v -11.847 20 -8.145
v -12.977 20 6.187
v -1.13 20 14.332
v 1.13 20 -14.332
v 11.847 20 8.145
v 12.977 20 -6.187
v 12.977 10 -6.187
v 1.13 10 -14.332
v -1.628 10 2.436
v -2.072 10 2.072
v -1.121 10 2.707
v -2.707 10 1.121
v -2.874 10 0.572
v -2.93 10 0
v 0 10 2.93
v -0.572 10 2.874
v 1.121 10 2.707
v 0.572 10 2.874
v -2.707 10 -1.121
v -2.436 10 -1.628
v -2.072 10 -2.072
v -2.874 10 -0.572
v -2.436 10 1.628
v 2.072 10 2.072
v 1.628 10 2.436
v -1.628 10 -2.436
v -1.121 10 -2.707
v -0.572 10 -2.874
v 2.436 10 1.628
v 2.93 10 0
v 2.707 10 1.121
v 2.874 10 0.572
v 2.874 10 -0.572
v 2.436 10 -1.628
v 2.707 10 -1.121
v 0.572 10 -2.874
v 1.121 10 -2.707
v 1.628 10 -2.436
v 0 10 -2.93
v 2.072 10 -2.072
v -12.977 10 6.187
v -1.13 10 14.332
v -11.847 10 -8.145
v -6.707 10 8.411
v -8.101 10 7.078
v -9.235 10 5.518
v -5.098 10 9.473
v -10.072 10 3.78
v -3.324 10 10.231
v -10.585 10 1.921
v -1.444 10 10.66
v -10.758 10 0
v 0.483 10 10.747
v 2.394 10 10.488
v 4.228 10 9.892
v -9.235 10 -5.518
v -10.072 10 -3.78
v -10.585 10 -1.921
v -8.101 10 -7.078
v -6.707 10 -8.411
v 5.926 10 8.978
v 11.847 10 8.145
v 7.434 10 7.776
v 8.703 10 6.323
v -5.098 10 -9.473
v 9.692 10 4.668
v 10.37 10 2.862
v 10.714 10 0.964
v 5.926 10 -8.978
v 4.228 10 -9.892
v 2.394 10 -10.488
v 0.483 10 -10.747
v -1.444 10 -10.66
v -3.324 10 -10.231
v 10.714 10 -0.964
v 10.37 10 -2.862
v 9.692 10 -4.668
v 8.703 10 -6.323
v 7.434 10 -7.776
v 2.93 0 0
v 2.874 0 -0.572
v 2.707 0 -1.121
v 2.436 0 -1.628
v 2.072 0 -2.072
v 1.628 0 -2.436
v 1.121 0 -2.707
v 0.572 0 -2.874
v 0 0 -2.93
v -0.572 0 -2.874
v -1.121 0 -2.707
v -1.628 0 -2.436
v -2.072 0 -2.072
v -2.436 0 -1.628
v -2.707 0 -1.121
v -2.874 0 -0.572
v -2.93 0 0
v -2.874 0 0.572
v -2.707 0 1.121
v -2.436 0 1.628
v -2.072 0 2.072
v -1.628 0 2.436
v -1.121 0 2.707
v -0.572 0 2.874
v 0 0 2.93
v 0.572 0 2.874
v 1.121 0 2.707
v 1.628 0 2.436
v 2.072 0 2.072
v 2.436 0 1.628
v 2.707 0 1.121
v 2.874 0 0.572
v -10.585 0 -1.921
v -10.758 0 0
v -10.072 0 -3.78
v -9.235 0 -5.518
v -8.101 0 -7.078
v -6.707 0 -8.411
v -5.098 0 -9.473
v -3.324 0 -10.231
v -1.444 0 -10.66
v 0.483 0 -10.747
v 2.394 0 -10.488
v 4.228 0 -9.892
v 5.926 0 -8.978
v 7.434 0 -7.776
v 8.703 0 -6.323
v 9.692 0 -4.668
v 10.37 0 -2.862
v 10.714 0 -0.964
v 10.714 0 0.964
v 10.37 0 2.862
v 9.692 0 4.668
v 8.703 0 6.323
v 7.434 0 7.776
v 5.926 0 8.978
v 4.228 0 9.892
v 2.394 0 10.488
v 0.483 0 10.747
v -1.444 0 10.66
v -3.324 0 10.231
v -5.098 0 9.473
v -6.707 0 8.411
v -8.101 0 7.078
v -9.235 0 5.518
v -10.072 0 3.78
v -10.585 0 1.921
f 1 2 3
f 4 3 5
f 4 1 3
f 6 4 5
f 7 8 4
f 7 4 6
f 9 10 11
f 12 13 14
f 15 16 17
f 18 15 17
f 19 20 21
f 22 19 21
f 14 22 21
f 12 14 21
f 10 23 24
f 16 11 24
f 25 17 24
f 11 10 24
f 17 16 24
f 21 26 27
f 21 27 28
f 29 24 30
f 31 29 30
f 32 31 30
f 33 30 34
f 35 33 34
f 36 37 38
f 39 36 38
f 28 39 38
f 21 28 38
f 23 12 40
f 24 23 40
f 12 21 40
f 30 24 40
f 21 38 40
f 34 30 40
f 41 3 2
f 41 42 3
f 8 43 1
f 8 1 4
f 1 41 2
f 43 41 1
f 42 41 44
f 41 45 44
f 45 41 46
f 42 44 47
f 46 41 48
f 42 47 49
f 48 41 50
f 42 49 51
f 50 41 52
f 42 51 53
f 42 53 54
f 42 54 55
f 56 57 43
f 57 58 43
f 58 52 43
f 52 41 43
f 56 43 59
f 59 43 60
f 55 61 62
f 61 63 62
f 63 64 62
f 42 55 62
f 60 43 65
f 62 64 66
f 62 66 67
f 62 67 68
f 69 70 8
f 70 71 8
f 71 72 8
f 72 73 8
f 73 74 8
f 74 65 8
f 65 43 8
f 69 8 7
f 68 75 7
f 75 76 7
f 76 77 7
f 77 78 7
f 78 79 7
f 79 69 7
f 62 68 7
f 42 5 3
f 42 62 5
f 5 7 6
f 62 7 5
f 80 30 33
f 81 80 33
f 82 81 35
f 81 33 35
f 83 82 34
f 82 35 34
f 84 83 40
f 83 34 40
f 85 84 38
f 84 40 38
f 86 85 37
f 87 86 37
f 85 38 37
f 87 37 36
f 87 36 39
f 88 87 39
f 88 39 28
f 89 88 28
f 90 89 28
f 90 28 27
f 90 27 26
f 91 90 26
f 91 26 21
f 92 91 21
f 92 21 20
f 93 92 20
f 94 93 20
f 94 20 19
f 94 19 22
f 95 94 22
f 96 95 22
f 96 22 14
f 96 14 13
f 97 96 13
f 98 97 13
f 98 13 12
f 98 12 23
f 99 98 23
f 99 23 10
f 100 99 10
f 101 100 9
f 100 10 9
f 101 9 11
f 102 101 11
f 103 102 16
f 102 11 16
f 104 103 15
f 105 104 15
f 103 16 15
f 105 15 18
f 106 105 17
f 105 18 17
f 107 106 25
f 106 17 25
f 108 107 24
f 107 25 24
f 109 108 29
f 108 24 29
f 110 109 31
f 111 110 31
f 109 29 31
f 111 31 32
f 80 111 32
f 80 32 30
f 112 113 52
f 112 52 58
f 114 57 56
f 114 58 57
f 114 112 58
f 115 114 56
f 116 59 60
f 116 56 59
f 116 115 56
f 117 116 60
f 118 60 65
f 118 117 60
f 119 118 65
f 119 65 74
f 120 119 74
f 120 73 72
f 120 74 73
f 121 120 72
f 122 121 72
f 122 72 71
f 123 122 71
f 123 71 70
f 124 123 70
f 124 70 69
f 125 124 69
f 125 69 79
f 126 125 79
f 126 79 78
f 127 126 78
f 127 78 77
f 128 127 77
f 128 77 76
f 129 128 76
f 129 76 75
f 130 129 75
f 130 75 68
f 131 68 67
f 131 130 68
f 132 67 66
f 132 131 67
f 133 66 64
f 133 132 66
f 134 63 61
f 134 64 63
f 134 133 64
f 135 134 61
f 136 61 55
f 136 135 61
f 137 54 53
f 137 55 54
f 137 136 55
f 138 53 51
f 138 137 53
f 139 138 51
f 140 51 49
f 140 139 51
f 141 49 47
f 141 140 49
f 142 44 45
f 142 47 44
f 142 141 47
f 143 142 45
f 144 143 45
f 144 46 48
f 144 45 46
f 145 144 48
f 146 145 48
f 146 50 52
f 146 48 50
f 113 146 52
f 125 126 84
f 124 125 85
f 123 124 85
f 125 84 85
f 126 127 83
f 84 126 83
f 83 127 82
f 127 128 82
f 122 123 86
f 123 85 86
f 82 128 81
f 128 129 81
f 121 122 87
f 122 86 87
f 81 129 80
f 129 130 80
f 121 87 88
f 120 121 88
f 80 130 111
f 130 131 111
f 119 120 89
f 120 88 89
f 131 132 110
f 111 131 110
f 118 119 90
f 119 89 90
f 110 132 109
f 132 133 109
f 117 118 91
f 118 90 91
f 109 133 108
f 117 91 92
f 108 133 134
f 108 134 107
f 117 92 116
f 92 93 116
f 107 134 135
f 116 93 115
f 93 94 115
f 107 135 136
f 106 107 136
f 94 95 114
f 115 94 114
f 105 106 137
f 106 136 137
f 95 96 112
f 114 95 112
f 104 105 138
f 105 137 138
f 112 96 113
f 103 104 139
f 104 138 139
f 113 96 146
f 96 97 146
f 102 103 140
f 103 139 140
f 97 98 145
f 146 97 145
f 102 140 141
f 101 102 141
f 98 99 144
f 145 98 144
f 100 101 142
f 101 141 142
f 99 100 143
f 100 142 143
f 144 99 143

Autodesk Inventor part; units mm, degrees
ref_plane "YZ Plane" through (0, 0, 0) normal (1, 0, 0) x (0, 1, 0)
ref_plane "XZ Plane" through (0, 0, 0) normal (0, 1, 0) x (-1, 0, 0)
ref_plane "XY Plane" through (0, 0, 0) normal (0, 0, 1) x (1, 0, 0)
sketch "Sketch1" plane through (0, 0, 0) normal (0, 1, 0) x (-1, 0, 0)
  circle A0 centre (0, 0) radius 10.7576
extrude "Extrusion1" add sketch "Sketch1" along normal blind 10
sketch "Sketch2" plane through (0, 10, 0) normal (0, 1, 0) x (1, 0, 0)
  circle A0 centre (0, 0) radius 10.7576 projected
  circle A1 centre (0, 0) radius 2.9303
extrude "Extrusion2" cut sketch "Sketch2" against normal blind 10 contours A1
sketch "Sketch3" plane through (0, 10, 0) normal (0, 1, 0) x (1, 0, 0)
  line L0 (11.8466, -8.1445) -> (-1.1301, -14.3317)
  line L1 (-1.1301, -14.3317) -> (-12.9767, -6.1872)
  line L2 (-12.9767, -6.1872) -> (-11.8466, 8.1445)
  line L3 (-11.8466, 8.1445) -> (1.1301, 14.3317)
  line L4 (1.1301, 14.3317) -> (12.9767, 6.1872)
  line L5 (12.9767, 6.1872) -> (11.8466, -8.1445)
  point P0 (0, 0)
  point P1 (0, 0)
extrude "Extrusion3" add sketch "Sketch3" along normal blind 10
